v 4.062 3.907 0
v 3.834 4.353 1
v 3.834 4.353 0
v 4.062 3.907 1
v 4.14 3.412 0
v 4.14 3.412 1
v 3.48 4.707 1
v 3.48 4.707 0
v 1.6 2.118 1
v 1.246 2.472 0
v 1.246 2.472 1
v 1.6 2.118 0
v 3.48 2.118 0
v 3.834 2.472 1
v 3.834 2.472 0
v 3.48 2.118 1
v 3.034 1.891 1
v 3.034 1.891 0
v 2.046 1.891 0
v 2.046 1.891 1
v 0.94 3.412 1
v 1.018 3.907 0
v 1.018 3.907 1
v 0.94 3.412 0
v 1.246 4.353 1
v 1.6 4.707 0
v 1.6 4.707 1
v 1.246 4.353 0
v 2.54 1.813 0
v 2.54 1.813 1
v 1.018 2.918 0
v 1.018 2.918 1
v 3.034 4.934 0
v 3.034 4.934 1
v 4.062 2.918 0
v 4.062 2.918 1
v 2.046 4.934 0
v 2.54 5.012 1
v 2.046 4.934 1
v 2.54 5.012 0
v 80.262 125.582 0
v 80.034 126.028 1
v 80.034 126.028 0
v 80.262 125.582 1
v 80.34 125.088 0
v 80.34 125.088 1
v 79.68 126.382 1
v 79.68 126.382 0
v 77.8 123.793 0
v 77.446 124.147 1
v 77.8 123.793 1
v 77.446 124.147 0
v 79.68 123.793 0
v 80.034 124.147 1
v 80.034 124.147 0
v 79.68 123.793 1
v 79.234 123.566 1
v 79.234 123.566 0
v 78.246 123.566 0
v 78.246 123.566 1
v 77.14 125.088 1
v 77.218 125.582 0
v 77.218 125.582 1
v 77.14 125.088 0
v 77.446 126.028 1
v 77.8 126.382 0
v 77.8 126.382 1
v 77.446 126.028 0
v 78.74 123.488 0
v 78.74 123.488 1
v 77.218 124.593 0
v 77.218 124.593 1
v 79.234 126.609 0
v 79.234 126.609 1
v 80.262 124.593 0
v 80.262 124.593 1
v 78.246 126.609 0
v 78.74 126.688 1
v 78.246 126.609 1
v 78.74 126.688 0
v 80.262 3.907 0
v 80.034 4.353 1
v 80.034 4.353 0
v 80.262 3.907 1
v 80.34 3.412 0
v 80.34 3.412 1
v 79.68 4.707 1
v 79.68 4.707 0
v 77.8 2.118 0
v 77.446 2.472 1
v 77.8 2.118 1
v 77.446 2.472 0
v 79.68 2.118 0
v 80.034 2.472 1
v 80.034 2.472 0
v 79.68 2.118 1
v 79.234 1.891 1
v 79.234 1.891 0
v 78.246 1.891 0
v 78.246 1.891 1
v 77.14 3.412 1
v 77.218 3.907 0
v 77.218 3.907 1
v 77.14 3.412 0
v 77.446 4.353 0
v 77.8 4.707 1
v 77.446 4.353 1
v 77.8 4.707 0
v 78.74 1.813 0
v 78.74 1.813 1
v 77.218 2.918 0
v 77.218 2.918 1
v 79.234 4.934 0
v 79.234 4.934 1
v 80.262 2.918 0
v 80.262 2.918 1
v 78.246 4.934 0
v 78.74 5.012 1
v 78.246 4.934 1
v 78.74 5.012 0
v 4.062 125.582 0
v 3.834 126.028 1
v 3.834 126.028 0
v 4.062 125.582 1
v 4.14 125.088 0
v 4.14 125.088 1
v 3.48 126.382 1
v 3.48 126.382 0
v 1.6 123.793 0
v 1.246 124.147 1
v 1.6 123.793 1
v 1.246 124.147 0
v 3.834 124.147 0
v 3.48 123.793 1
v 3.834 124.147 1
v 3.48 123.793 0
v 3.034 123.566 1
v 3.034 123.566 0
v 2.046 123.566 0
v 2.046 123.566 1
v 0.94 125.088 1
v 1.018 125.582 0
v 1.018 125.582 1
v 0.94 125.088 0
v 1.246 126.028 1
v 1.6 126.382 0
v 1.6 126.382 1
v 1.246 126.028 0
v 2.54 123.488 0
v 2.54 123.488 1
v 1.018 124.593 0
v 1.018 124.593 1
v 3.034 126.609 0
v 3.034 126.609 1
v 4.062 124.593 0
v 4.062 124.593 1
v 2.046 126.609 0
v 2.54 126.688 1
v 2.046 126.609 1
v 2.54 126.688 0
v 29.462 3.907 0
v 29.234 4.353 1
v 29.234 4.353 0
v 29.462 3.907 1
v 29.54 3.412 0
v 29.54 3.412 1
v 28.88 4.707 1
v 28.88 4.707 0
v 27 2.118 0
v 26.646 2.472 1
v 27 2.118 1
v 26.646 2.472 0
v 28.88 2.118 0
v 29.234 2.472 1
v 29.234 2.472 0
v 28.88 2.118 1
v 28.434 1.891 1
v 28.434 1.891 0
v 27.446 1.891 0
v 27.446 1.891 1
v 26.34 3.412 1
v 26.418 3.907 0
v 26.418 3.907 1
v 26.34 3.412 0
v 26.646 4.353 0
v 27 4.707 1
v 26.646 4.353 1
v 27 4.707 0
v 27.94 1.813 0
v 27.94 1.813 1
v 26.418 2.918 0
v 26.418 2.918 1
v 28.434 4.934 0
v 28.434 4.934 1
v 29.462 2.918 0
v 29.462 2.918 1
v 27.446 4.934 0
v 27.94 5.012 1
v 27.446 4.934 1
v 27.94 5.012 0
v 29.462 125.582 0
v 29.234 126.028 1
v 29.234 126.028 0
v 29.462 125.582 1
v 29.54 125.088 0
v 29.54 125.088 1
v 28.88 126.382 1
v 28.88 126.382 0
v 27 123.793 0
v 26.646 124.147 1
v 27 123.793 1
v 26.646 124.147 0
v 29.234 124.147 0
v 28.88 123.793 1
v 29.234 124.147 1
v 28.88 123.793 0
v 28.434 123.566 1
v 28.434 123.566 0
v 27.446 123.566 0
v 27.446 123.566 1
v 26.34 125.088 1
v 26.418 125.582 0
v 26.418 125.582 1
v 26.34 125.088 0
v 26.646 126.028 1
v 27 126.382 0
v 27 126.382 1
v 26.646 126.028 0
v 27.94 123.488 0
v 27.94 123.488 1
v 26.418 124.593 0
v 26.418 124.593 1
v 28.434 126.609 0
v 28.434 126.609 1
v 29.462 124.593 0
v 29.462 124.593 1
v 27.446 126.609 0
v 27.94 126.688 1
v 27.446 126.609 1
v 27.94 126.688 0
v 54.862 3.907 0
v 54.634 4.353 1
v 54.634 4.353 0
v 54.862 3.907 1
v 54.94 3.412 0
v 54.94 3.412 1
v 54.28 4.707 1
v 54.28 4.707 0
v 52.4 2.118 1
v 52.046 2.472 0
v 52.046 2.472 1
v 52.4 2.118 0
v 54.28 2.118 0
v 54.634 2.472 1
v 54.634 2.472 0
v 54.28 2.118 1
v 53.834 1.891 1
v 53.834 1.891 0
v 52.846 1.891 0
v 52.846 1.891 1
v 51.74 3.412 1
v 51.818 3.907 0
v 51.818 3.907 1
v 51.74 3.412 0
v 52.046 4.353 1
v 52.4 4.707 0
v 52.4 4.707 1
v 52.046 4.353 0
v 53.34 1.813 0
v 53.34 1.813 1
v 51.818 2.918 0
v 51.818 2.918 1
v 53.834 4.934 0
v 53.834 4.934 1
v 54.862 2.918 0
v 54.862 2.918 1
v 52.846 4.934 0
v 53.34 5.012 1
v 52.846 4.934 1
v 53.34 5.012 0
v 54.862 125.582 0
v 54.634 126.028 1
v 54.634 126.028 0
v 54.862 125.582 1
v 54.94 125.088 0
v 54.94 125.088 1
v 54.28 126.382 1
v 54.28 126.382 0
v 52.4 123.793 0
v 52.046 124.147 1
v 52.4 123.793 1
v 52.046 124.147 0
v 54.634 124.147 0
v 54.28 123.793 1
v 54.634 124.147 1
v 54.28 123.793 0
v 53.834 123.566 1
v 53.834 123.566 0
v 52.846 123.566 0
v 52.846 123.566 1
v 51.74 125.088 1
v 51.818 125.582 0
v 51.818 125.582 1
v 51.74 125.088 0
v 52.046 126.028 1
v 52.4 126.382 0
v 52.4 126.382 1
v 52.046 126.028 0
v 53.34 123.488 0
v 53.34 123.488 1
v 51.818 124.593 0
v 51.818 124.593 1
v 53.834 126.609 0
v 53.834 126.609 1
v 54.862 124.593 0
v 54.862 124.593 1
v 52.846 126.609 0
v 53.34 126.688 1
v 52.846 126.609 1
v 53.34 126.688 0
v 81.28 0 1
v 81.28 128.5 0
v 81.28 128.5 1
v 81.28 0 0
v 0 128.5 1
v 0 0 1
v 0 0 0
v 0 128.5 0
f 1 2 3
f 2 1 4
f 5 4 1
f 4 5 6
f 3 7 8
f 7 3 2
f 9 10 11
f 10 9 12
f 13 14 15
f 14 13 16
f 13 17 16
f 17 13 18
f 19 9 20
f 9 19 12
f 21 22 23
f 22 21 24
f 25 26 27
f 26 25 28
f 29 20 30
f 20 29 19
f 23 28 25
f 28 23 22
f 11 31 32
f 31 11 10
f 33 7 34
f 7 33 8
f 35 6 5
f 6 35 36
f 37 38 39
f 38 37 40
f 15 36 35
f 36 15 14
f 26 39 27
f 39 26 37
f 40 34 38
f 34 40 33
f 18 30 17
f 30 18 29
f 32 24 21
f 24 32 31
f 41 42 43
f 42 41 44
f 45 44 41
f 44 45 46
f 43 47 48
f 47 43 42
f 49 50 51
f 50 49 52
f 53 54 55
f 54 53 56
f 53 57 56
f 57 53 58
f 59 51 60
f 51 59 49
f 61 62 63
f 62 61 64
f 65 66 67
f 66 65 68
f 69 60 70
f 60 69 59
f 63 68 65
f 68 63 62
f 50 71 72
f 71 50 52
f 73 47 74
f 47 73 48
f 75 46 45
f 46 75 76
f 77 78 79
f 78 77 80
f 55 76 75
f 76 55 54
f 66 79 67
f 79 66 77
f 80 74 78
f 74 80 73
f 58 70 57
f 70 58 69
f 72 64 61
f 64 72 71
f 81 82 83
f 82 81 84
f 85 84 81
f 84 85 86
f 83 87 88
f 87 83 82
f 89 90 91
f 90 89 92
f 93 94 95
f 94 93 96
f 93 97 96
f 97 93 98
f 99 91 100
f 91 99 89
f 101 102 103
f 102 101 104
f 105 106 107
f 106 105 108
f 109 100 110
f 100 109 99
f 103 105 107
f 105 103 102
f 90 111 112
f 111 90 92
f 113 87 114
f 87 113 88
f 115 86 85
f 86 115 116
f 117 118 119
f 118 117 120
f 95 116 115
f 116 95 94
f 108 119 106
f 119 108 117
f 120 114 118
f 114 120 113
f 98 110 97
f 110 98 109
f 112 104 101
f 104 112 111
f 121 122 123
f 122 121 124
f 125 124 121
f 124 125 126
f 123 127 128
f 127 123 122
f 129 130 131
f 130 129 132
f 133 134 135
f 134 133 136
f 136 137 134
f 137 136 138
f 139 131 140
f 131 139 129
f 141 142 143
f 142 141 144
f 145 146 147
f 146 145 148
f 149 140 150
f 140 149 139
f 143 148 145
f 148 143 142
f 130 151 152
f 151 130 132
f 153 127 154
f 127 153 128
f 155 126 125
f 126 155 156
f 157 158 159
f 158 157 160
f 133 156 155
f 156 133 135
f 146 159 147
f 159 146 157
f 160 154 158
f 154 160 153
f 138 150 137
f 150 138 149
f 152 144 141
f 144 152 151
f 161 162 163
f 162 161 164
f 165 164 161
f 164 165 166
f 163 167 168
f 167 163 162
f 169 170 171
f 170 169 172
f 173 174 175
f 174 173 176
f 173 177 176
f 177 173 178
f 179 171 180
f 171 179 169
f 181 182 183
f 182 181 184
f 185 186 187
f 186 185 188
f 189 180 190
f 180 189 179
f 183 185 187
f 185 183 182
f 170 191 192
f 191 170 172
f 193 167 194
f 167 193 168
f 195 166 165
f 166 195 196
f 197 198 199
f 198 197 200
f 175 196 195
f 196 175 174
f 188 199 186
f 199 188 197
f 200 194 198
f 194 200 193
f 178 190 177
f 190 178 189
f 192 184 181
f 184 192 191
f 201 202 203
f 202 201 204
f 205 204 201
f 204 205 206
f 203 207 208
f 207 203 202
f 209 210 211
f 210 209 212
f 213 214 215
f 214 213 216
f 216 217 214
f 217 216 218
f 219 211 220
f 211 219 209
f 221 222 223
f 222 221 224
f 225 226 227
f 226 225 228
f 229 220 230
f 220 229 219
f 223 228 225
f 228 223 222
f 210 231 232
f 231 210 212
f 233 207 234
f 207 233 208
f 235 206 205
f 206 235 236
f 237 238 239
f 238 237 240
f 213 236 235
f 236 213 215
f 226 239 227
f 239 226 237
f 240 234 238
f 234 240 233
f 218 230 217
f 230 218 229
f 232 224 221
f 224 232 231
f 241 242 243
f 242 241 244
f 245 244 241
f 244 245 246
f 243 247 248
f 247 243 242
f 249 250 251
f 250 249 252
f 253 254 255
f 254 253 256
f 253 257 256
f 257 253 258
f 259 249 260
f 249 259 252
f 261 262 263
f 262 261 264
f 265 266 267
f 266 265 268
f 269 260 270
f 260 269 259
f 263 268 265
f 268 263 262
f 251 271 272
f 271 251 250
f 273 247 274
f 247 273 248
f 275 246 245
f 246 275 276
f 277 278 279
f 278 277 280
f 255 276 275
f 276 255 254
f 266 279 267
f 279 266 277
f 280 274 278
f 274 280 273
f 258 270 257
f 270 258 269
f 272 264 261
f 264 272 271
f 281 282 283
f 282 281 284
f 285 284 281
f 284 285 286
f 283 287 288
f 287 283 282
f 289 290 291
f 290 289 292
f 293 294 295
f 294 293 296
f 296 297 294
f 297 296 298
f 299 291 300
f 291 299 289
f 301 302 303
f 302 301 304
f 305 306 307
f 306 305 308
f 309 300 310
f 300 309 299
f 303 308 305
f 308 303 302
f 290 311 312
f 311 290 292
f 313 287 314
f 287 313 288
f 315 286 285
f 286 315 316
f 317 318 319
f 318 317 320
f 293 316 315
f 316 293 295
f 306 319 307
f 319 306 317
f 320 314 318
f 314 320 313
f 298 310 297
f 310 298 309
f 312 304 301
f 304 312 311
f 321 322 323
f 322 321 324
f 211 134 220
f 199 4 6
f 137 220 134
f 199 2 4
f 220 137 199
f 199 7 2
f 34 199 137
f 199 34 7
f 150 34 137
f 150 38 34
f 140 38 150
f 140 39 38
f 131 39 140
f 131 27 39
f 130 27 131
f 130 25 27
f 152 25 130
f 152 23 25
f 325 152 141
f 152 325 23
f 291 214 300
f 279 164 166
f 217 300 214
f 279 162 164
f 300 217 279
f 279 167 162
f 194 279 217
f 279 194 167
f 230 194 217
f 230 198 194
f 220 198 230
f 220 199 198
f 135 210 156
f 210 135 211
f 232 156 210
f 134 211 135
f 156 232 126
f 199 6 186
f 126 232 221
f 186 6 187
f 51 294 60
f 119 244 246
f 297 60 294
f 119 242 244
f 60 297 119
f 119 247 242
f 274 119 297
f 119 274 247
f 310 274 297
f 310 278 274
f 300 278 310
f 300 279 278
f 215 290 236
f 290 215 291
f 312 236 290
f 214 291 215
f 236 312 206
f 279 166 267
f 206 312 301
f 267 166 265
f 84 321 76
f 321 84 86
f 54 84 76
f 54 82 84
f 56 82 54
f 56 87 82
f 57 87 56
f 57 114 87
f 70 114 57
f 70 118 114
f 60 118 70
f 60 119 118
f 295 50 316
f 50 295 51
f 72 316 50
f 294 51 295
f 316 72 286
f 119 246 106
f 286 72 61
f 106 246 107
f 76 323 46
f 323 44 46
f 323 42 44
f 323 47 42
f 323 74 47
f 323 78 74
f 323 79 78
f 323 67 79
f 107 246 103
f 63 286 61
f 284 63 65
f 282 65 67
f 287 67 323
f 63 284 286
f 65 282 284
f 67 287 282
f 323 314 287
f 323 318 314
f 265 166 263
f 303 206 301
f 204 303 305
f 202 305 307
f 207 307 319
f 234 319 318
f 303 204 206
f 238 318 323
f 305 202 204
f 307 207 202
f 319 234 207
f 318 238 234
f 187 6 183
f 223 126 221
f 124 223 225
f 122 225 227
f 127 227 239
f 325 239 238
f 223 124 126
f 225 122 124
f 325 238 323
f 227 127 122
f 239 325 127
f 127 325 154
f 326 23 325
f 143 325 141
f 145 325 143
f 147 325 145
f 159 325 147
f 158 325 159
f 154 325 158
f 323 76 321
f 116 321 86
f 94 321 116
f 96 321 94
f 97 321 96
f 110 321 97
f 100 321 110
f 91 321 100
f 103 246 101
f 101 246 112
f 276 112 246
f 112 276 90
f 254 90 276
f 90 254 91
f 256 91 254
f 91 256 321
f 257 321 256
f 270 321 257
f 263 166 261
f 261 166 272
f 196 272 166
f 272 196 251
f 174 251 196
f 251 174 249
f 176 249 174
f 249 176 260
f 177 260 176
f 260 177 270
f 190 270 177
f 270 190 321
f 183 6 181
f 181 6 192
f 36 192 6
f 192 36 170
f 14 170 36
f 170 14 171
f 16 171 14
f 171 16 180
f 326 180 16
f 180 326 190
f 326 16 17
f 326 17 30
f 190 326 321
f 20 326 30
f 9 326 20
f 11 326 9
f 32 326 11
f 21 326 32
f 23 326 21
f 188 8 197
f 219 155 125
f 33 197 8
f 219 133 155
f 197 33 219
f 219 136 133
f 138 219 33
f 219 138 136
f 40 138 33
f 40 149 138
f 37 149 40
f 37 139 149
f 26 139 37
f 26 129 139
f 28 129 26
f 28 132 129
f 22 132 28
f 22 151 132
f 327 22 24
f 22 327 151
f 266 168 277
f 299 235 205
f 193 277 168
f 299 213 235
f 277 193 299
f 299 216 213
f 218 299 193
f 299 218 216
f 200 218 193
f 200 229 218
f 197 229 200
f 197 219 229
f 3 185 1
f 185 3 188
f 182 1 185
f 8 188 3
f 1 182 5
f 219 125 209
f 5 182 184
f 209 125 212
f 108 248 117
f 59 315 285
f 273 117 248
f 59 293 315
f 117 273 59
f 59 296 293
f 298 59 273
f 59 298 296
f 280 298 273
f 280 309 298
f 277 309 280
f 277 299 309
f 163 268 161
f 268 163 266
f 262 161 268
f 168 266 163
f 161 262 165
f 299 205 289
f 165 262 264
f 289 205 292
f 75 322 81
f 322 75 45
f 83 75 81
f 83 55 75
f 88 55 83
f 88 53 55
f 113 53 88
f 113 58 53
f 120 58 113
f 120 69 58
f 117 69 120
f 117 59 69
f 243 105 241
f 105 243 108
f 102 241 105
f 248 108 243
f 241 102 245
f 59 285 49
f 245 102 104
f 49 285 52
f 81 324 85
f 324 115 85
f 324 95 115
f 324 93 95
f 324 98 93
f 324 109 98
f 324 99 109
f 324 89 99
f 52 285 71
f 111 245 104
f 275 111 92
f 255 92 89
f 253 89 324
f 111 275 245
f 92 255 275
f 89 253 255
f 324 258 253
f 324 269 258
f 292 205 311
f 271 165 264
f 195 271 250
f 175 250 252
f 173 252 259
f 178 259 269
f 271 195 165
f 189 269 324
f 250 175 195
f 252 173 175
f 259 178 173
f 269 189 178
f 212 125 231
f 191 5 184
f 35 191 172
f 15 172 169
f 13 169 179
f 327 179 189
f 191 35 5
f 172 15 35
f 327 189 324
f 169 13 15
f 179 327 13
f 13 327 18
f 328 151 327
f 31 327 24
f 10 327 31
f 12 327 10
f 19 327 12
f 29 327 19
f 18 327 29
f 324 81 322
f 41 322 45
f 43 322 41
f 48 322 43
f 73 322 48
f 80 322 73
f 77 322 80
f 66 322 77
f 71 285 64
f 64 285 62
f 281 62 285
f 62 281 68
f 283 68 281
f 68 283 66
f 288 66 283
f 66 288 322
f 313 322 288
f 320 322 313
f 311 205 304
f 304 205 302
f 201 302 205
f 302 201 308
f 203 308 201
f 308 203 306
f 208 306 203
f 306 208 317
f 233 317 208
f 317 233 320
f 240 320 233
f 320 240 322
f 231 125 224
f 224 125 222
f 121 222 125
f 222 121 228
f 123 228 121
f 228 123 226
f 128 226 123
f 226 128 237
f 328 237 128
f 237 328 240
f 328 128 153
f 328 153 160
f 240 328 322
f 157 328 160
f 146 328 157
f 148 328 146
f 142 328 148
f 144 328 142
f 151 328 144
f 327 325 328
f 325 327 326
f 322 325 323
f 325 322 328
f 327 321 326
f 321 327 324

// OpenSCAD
// eurorack panel
// adapted from https://www.thingiverse.com/thing:2055716
//
// github.com/pchuck/generative-3d-models
//

// customizable parameters
hp = 4; // width in hp of the panel
thick = 1; // panel thickness
holes = 1; // desired number of holes along top and bottom of panel
hole_width = 3.2; // 5.08mm; larger than hole_d, for easier mounting.

// constants
hp_mm = 5.08; // mm per hp
hole_d = 3.2; // mount hole diameter
hole_r = hole_d / 2; // mount hole radius
offset = hp_mm / 2; // offset from edge of panel to center of hole
height = 133.35; // overall panel height. 133.35mm = 3u.
height_o = 128.5; // panel outer height
height_i = 110; // panel inner height. rail clearance = ~11.675mm.
height_r = (height - height_o) / 2; // rail height
height_s = (height_o - height_i - height_r * 2) / 2; // surface height
hw_diff = hole_width - hole_d;
offset_y = height_s / 2;

module panel(hp, holes=2, hw=hole_width) {
    hole_skip = hp / (holes - 1); // number of hp to skip per hole
    difference() {
        cube([hp_mm * hp, height_o, thick]);
        mount_holes(hp, holes, hole_skip, hole_width); 
    }
}

module mount_hole(hw=hole_width) {
    // diffs m/b larger than object being diffed from for ideal BSP operations
    hole_depth = thick + 2; 
    if(hw_diff < 0) { hw_diff = 0; }
    translate([0, 0, -1]) {
        union() {
            cylinder(r=hole_r, h=hole_depth, $fn=20);
            translate([0, -hole_r, 0]) cube([hw_diff, hole_d, hole_depth]);
            translate([hw_diff, 0, 0]) cylinder(r=hole_r, h=hole_depth, $fn=20);
        }
    }
}

module mount_holes(hp, holes, hole_skip, hw) {
    top = offset_y;
    bottom = height_o - offset_y;
    left = hp * hp_mm - offset;
    right = offset;

    translate([right, top]) mount_hole();
    translate([left, bottom]) mount_hole();
    if(holes > 1) {
        translate([left, top]) mount_hole();
        translate([right, bottom]) mount_hole();
        for(i=[hole_skip + 1: hole_skip: hp]) {
            translate([floor(i) * hp_mm - offset, top]) mount_hole(); // R
            translate([floor(i) * hp_mm - offset, bottom]) mount_hole(); // L
        }
    }
}


// tests / favorites
//panel(1, 1, hole_width);
//panel(2, 1, hole_width);
//panel(4, 1, hole_width);
//panel(6, 2, hole_width);
//panel(8, 2, hole_width);
//panel(10, 2, hole_width);
//panel(12, 2, hole_width);
panel(16, 4, hole_width);
//panel(20, 4, hole_width);
//panel(24, 4, hole_width);
//panel(32, 4, hole_width);

// default
//panel(hp, holes, hole_width);
